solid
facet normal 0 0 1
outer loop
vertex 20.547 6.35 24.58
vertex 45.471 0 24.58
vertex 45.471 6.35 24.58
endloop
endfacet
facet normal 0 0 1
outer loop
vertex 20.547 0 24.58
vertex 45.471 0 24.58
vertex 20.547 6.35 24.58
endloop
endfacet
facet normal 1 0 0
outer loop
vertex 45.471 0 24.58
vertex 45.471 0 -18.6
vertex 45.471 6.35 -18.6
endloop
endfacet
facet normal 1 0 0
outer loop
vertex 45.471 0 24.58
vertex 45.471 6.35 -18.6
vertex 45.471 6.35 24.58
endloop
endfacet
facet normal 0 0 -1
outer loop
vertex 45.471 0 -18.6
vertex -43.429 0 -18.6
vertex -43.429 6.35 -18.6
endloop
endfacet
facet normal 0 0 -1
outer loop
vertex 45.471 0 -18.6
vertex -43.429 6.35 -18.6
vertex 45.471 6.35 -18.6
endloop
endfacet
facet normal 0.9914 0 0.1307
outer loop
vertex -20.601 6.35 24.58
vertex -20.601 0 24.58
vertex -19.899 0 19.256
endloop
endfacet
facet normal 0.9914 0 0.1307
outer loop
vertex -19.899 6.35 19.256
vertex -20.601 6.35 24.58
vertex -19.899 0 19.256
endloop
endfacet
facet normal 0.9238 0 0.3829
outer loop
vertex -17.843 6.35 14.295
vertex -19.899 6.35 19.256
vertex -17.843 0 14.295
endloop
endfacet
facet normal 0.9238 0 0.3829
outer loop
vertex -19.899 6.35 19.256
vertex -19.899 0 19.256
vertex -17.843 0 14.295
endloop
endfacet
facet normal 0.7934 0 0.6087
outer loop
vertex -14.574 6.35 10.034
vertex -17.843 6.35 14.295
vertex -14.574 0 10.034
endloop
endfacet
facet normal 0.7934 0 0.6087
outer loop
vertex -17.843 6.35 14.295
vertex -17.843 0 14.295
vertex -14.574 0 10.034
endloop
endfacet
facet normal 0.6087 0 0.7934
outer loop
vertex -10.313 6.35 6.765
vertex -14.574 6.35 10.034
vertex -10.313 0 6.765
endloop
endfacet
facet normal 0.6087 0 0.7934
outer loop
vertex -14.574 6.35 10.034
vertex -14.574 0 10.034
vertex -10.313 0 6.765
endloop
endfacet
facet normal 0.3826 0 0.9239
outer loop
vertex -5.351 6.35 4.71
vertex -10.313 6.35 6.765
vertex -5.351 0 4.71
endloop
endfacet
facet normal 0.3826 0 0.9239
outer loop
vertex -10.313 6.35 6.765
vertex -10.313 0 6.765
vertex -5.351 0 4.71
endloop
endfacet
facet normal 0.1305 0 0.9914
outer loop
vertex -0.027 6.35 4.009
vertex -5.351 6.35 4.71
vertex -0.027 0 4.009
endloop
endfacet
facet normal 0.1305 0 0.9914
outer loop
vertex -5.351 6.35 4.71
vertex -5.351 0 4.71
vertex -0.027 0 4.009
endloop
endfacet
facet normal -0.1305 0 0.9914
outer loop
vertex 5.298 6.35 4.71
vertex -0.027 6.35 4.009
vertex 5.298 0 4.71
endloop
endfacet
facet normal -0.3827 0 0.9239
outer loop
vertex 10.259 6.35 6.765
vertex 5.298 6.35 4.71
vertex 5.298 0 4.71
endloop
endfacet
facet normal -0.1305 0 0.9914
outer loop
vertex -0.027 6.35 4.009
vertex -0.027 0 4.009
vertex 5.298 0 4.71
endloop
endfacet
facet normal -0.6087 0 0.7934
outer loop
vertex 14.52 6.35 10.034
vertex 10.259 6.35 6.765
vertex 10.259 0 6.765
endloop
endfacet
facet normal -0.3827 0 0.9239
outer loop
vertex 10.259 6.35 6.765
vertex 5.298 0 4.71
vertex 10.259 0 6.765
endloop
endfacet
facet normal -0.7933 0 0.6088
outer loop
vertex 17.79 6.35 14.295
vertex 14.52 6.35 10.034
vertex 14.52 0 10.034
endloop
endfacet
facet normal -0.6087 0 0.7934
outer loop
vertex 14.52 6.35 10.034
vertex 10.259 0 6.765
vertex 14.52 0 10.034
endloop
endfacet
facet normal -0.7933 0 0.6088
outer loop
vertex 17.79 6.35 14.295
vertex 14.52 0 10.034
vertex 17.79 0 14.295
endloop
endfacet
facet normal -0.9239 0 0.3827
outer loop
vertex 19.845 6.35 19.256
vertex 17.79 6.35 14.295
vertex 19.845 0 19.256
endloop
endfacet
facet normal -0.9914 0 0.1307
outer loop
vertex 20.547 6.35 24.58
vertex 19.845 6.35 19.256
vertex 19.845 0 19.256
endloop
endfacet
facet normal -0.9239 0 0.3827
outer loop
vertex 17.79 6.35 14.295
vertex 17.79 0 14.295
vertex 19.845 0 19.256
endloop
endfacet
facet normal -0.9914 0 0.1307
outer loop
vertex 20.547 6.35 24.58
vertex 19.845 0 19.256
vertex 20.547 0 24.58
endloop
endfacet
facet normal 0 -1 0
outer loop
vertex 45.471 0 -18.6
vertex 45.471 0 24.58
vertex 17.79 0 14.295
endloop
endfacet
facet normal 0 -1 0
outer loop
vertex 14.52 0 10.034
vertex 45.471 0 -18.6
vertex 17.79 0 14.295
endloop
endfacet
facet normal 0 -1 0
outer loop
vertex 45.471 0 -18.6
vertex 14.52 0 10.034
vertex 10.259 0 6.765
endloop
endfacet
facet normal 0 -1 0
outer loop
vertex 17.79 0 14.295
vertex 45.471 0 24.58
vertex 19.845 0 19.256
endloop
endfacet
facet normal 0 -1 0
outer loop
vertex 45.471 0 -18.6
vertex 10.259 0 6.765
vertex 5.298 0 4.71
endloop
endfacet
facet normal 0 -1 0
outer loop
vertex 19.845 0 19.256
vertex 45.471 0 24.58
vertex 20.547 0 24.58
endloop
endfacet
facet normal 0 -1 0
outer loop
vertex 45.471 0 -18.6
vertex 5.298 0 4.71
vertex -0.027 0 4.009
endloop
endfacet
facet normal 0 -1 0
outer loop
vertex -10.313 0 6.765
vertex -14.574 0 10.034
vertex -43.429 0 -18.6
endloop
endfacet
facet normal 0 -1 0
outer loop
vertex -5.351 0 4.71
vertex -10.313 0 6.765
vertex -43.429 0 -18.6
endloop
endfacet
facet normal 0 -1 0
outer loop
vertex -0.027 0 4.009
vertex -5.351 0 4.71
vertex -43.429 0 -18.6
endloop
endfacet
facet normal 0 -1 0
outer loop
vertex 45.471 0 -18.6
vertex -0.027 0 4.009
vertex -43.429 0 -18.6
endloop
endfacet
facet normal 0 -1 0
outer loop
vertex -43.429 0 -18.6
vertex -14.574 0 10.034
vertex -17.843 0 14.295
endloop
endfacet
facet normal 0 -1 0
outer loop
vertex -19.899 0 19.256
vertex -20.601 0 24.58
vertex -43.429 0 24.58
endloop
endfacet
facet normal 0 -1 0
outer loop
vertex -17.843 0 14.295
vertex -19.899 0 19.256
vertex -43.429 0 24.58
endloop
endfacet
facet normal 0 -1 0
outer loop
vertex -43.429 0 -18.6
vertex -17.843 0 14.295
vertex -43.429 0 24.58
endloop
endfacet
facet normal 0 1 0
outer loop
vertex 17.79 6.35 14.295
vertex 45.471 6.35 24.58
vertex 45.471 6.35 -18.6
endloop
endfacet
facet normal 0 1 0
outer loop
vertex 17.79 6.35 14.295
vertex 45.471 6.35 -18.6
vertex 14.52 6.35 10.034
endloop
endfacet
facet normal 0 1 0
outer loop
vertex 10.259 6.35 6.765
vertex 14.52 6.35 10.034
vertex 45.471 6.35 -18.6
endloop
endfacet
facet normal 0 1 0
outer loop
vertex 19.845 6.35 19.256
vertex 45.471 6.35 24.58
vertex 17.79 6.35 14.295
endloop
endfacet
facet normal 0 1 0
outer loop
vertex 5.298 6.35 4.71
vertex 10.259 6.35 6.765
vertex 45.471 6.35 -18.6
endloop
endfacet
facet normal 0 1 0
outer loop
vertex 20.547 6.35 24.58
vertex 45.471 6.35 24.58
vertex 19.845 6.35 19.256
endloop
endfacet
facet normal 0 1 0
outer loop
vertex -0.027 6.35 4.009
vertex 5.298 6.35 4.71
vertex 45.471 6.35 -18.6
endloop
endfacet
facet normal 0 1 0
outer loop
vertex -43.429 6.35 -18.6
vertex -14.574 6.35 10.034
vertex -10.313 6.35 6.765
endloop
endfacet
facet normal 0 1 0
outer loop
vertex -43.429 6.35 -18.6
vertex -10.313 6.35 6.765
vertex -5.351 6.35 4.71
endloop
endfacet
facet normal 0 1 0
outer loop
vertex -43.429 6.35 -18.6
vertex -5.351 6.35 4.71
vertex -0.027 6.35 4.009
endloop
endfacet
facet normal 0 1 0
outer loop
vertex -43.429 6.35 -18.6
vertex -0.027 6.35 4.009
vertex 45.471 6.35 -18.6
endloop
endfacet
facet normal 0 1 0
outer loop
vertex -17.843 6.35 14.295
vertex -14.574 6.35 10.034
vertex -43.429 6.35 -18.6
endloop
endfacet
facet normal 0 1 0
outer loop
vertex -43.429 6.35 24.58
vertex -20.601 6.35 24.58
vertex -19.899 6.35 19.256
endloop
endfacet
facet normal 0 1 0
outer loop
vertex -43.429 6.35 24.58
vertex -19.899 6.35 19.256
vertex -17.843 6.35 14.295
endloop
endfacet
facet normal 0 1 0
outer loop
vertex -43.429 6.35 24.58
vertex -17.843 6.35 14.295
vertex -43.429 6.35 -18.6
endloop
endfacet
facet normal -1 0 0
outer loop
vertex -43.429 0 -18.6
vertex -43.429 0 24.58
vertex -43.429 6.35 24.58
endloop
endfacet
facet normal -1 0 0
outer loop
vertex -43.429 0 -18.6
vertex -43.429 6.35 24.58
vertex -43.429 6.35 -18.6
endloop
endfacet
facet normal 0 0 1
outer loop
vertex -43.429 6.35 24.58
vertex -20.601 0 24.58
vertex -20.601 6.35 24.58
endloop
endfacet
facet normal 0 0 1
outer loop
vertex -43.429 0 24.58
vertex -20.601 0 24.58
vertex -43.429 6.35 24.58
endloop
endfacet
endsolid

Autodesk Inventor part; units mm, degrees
ref_plane "YZ Plane" through (0, 0, 0) normal (1, 0, 0) x (0, 1, 0)
ref_plane "XZ Plane" through (0, 0, 0) normal (0, 1, 0) x (-1, 0, 0)
ref_plane "XY Plane" through (0, 0, 0) normal (0, 0, 1) x (1, 0, 0)
sketch "Sketch1" plane through (0, 0, 0) normal (0, 1, 0) x (-1, 0, 0)
  line L0 (43.4289, -18.5999) -> (-45.4711, -18.5999)
  line L1 (-45.4711, -18.5999) -> (-45.4711, 24.5801)
  line L2 (-45.4711, 24.5801) -> (43.4289, 24.5801)
  line L3 (43.4289, 24.5801) -> (43.4289, -18.5999)
  point P0 (0, 0)
  dimension "d2" = 88.9
  dimension "d3" = 43.18
extrude "Extrusion1" add sketch "Sketch1" along normal blind 6.35
sketch "Sketch2" plane through (0, 6.35, 0) normal (0, 1, 0) x (1, 0, 0)
  point P0 (0, 0)
  point P1 (-0.0268, -24.5835)
hole "Hole1" at (-0.0268, 6.35, 24.5835) direction (0, -1, 0) diameter 41.148 end through all
properties part number "InventorPart1Commit2"
